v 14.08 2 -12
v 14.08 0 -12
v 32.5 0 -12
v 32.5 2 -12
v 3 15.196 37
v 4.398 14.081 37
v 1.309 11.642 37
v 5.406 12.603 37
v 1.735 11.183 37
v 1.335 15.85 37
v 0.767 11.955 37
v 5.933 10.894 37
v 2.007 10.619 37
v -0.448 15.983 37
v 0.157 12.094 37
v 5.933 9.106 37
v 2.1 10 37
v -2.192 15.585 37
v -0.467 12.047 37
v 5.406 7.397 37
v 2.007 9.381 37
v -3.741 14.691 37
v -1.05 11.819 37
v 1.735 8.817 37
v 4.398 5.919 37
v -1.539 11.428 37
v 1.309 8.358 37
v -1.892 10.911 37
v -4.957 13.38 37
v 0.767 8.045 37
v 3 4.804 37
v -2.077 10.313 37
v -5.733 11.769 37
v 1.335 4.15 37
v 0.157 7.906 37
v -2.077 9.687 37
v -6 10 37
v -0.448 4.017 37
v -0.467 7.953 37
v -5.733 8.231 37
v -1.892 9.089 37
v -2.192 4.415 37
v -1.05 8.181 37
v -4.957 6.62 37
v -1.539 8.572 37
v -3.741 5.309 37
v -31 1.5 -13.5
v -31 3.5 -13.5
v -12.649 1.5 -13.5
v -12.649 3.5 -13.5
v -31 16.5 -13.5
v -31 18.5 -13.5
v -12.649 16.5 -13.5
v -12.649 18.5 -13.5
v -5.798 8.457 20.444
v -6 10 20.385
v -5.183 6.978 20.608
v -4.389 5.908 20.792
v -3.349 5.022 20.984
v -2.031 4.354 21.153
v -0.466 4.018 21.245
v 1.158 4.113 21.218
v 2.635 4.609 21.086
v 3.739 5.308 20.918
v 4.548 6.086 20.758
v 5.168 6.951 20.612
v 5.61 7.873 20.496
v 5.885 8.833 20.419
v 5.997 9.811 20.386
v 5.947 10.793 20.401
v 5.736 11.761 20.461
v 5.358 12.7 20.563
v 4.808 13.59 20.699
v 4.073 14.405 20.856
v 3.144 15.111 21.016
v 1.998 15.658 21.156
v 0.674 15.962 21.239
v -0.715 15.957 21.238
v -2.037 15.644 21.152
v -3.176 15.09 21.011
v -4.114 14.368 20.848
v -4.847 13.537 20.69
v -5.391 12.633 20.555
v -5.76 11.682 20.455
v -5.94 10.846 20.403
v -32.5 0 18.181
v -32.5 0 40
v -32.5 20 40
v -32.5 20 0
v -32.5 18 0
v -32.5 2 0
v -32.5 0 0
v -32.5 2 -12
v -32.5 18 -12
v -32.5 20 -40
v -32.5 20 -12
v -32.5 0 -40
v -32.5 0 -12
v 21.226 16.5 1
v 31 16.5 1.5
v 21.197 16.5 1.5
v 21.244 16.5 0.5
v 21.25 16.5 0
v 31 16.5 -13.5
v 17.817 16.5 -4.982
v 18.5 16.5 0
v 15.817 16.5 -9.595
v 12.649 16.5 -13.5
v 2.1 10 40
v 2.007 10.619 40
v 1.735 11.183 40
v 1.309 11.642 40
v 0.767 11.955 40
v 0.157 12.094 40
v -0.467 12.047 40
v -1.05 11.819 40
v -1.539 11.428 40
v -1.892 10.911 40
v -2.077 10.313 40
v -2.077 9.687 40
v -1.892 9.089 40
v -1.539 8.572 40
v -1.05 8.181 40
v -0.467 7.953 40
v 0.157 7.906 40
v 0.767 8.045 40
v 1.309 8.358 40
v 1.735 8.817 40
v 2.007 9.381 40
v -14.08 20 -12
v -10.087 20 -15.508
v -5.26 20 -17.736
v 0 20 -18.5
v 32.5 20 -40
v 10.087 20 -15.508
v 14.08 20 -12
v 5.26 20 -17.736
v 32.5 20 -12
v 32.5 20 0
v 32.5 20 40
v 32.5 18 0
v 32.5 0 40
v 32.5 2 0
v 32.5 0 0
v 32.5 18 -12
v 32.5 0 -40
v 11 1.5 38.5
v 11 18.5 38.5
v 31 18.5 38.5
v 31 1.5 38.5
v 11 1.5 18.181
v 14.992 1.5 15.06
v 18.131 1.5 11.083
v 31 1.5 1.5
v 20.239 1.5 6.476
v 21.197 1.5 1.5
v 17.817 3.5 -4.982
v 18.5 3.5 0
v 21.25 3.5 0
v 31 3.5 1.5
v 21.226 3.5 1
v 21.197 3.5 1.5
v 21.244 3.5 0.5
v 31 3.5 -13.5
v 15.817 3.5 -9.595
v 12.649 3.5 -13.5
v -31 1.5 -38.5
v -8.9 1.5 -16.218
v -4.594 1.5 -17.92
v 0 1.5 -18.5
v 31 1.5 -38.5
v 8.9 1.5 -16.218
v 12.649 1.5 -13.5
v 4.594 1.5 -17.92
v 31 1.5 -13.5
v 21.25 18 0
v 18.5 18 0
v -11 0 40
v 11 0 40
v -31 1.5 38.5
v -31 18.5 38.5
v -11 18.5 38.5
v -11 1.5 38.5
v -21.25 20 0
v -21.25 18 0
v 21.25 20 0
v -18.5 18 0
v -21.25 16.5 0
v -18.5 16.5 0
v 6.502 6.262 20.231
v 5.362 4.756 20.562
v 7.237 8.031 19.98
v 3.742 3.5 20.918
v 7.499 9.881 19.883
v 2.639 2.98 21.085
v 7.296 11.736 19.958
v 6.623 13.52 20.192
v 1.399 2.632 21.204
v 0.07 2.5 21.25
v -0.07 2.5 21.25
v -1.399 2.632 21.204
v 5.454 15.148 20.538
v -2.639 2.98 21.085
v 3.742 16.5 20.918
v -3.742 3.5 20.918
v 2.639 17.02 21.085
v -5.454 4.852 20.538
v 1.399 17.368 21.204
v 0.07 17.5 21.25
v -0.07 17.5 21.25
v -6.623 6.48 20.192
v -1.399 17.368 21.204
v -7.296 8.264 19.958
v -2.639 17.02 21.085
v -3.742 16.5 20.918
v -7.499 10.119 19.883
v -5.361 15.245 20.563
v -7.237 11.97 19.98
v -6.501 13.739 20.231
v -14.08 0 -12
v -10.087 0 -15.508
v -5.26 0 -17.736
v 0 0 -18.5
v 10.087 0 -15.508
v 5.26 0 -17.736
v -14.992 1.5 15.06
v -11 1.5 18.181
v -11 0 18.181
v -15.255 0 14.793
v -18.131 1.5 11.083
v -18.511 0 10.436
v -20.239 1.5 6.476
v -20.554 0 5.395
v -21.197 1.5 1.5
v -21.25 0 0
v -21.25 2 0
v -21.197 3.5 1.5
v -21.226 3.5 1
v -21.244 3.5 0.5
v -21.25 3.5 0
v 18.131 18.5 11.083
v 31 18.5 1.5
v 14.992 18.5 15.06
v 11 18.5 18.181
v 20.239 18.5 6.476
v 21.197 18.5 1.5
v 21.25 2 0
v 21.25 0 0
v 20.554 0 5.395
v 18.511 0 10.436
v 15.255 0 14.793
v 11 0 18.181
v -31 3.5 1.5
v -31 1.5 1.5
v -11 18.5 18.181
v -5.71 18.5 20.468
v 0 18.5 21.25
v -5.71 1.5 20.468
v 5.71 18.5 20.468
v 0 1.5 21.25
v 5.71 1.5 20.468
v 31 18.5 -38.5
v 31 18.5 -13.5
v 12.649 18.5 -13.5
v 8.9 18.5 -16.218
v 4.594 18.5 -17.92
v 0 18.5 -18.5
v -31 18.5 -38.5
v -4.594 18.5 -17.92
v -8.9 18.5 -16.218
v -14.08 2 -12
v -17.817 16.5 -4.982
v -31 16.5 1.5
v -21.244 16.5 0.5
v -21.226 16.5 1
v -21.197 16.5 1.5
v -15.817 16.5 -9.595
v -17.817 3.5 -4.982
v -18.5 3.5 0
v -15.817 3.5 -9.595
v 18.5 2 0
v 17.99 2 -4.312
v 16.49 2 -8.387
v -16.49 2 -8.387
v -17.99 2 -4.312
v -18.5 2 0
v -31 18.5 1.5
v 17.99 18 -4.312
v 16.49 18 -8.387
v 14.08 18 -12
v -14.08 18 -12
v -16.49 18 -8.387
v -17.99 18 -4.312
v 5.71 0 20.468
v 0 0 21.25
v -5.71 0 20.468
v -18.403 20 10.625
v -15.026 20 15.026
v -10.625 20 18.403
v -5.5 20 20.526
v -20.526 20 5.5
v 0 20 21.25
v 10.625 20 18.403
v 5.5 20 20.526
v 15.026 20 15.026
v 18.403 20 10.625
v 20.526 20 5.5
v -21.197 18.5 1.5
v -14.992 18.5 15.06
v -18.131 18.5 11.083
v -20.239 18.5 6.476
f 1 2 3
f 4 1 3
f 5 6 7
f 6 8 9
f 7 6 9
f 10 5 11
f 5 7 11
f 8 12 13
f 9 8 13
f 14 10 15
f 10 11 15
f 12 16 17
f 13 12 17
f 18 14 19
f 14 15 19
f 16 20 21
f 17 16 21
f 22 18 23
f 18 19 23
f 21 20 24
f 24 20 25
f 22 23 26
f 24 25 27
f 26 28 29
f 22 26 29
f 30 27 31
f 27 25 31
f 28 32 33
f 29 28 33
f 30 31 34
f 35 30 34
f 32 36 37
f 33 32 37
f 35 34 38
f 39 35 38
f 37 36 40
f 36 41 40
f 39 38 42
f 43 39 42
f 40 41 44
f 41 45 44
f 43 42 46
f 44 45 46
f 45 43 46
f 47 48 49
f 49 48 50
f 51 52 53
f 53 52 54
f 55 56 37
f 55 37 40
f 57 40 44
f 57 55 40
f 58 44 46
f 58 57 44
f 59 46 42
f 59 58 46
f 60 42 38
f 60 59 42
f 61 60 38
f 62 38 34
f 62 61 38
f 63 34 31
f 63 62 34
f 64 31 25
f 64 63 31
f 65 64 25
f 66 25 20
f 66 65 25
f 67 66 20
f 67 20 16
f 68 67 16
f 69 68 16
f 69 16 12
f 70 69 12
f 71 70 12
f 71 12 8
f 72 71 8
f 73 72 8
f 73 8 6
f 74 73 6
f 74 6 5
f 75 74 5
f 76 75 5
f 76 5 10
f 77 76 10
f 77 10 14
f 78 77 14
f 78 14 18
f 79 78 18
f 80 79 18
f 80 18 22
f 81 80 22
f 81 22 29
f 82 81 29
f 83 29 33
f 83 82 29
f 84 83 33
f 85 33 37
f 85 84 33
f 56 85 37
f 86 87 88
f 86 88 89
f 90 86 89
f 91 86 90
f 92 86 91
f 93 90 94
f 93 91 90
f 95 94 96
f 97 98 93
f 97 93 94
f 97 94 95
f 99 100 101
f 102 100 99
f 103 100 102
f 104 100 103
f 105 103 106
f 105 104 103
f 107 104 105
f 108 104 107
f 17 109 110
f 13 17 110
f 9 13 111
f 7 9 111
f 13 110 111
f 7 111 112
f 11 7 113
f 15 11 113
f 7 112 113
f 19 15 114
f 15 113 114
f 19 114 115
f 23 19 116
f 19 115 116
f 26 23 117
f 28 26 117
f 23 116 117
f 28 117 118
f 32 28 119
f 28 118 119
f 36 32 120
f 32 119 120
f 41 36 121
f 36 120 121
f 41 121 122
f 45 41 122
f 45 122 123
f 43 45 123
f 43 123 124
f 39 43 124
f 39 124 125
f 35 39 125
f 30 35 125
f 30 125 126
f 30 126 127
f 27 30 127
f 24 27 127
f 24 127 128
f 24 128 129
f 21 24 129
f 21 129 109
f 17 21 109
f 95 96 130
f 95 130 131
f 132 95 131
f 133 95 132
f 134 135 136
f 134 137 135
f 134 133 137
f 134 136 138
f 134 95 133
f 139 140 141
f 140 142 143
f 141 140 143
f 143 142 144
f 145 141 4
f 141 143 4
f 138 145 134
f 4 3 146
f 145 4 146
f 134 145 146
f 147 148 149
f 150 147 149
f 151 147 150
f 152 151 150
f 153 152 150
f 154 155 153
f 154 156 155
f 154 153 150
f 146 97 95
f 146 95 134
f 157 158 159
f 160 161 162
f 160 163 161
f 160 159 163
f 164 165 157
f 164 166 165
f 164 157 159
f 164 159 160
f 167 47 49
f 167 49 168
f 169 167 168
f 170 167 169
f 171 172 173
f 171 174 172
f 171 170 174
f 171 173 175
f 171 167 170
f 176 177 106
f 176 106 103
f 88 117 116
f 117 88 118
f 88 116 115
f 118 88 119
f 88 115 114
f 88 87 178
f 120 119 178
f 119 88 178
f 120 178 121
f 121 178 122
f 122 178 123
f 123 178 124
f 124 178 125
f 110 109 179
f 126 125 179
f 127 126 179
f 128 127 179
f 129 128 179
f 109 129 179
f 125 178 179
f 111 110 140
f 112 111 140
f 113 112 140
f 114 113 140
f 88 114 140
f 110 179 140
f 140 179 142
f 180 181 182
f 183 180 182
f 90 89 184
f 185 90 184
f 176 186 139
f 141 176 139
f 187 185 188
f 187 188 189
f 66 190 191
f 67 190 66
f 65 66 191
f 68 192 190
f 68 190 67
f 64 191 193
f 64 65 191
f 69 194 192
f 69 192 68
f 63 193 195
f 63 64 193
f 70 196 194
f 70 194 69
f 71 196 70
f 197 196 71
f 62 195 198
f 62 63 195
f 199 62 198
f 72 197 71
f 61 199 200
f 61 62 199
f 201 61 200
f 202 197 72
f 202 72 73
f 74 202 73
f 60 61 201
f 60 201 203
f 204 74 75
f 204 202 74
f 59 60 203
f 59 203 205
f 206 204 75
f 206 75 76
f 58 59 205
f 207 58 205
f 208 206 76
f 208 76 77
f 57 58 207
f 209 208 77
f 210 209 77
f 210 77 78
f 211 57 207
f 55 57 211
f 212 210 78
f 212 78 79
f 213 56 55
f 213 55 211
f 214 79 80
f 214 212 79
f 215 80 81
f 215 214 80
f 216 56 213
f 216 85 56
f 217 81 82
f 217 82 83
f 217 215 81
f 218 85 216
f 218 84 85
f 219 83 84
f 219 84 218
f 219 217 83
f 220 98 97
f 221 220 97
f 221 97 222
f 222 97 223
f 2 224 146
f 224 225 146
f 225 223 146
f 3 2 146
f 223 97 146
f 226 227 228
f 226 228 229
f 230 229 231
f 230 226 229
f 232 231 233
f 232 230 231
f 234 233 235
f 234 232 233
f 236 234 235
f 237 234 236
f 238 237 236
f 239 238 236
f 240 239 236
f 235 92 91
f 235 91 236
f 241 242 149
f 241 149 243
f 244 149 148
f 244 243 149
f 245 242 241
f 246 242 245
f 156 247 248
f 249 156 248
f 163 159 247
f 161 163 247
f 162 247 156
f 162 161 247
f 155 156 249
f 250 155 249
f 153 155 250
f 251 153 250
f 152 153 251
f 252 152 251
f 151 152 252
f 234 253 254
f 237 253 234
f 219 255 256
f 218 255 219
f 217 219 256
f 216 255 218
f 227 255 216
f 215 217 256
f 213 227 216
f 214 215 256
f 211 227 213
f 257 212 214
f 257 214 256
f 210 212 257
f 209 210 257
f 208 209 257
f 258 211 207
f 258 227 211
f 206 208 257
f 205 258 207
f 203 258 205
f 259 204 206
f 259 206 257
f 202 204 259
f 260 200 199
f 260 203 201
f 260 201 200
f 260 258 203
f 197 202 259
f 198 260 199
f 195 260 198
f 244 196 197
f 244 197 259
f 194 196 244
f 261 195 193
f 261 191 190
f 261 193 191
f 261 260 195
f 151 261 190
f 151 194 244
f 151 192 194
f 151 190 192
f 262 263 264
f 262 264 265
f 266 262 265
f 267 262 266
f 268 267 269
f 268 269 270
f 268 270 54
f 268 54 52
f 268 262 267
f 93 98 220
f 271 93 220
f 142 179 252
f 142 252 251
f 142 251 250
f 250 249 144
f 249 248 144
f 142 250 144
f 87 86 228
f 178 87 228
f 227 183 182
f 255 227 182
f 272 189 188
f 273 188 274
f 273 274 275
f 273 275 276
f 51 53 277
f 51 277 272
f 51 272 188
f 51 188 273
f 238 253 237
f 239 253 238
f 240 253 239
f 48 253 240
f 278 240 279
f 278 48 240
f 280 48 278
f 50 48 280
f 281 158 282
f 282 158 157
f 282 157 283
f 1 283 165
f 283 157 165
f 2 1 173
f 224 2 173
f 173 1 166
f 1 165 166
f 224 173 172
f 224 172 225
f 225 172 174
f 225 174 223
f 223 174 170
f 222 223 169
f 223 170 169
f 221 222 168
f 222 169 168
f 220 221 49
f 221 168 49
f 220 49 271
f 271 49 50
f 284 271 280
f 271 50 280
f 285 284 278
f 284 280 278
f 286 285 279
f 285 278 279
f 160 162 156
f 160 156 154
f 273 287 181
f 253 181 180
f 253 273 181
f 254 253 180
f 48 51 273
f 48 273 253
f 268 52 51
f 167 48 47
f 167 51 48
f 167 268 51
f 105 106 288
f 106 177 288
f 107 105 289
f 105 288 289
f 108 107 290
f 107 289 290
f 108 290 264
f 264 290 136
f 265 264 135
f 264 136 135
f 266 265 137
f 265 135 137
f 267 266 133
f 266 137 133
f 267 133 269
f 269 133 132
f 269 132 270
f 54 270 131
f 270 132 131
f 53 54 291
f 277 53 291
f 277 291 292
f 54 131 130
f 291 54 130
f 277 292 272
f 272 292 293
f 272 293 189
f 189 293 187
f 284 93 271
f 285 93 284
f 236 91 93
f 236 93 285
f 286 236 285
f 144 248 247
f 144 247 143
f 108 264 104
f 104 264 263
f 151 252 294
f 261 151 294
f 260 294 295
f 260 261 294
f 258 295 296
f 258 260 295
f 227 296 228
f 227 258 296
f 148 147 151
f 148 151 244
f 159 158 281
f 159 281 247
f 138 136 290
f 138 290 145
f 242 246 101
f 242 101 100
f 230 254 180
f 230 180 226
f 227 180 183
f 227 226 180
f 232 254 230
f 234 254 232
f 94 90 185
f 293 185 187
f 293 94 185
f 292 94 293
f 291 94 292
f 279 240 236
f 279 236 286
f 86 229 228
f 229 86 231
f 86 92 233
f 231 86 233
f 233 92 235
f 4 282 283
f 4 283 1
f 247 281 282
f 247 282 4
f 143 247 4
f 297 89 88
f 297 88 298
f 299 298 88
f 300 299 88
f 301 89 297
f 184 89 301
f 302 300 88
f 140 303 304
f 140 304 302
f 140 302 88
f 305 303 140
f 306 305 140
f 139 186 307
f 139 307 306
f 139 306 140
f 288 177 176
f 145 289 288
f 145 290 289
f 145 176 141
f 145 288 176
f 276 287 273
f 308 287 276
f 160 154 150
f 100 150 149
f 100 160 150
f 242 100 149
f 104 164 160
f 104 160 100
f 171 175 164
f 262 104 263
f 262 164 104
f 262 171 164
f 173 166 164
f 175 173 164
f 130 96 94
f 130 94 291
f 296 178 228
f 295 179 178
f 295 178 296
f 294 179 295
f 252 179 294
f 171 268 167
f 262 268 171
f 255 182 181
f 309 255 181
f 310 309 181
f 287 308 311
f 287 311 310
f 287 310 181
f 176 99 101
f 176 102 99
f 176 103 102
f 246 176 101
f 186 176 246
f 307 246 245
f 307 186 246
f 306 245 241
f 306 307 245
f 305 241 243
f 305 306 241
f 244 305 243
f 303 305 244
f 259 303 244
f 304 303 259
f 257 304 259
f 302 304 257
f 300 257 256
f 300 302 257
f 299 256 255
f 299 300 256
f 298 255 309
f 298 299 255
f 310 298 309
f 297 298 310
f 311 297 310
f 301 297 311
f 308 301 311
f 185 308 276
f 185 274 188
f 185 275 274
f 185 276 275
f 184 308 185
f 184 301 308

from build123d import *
from build123d.topology import SkipClean

# Parameters (mm, degrees)
SKETCH_1_W              = 65
SKETCH_1_H              = 80
EXTRUDE_1_DEPTH         = 20
CUT_EXTRUDE_1_DEPTH     = 56.283360969
SKETCH_3_R              = 18.5
CUT_EXTRUDE_2_DEPTH     = 56.283360969
SKETCH_4_R              = 6
CUT_EXTRUDE_3_DEPTH     = 37
CUT_EXTRUDE_4_REACH     = 90.635
SKETCH_5_R              = 2.1
SKETCH_6_W              = 65
SKETCH_6_H              = 12
CUT_EXTRUDE_5_DEPTH     = 2
SKETCH_7_W              = 65
SKETCH_7_H              = 12
CUT_EXTRUDE_6_DEPTH     = 2
SHELL_START             = -38.5
SHELL_1_DEPTH           = 77
SHELL_1_2_DEPTH         = 25
SHELL_START_2           = 1.5
SHELL_1_3_DEPTH         = 37
EXTRUDE_START           = 21.249883538
EXTRUDE_2_OUTLINE_W     = 22
EXTRUDE_2_OUTLINE_H     = 17
EXTRUDE_2_OUTLINE_R     = 7.5
EXTRUDE_2_OUTLINE_H_2   = 26.054315759
EXTRUDE_2_DEPTH         = 18.750116462
EXTRUDE_START_2         = 18.181377836
EXTRUDE_2_2_OUTLINE_W   = 22
EXTRUDE_2_2_OUTLINE_H   = 17
EXTRUDE_2_2_OUTLINE_H_2 = 26.054315759
EXTRUDE_2_2_DEPTH       = 3.068505702
EXTRUDE_START_3         = -26.054315759
EXTRUDE_2_3_DEPTH       = 44.554315759
SKETCH_9_W              = 21.818622164
SKETCH_9_H              = 26.054315759
CUT_EXTRUDE_7_DEPTH     = 65.583878559


with BuildPart() as part:
    # 草图1 → 凸台-拉伸1 (new body)
    with BuildSketch(Plane(origin=(0, 0, 0), x_dir=(1, 0, 0), z_dir=(0, 1, 0))):
        Rectangle(SKETCH_1_W, SKETCH_1_H)
    extrude(amount=EXTRUDE_1_DEPTH)

    # 草图2 → 切除-拉伸1 (cut, through all)
    with BuildSketch(Plane(origin=(0, 20, 0), x_dir=(1, 0, 0), z_dir=(0, 1, 0))):
        with BuildLine():
            Line((-21.25, 0), (21.25, 0))
            ThreePointArc((21.25, 0), (0, -21.25), (-21.25, 0))
        make_face()
    extrude(amount=-CUT_EXTRUDE_1_DEPTH, mode=Mode.SUBTRACT)

    # 草图3 → 切除-拉伸2 (cut, through all)
    with BuildSketch(Plane(origin=(0, 20, 0), x_dir=(-1, 0, 0), z_dir=(0, 1, 0))):
        Circle(SKETCH_3_R)
    extrude(amount=-CUT_EXTRUDE_2_DEPTH, mode=Mode.SUBTRACT)

    # 草图4 → 切除-拉伸3 (cut)
    with BuildSketch(Plane.XY):
        with Locations(Location((0, 10, 0), (0, 0, 180))):
            Circle(SKETCH_4_R)
    extrude(amount=CUT_EXTRUDE_3_DEPTH, mode=Mode.SUBTRACT)

    # 草图5 → 切除-拉伸4 (cut, up to next)
    with BuildSketch(Plane.XY.offset(40), mode=Mode.PRIVATE) as cut_extrude_4_sk1:
        with Locations((0, 10)):
            Circle(SKETCH_5_R)
    cut_extrude_4_tool1 = extrude(cut_extrude_4_sk1.sketch, amount=-CUT_EXTRUDE_4_REACH, mode=Mode.PRIVATE) & part.part
    add(cut_extrude_4_tool1.solids().sort_by_distance((0, 10, 40))[0], mode=Mode.SUBTRACT)

    # 草图6 → 切除-拉伸5 (cut)
    with BuildSketch(Plane(origin=(0, 20, 0), x_dir=(1, 0, 0), z_dir=(0, 1, 0))):
        with Locations((0, 6)):
            Rectangle(SKETCH_6_W, SKETCH_6_H)
    extrude(amount=-CUT_EXTRUDE_5_DEPTH, mode=Mode.SUBTRACT)

    # 草图7 → 切除-拉伸6 (cut)
    with BuildSketch(Plane.XZ):
        with Locations((0, -6)):
            Rectangle(SKETCH_7_W, SKETCH_7_H)
    extrude(amount=-CUT_EXTRUDE_6_DEPTH, mode=Mode.SUBTRACT)

    # 抽壳1: read off the stored shape, not the designer's step
    # 抽壳1 outline → 抽壳1 (cut)
    with BuildSketch(Plane.XY.offset(SHELL_START)):
        with BuildLine():
            Line((3.741657387, 3.5), (31, 3.5))
            Line((31, 3.5), (31, 16.5))
            Line((31, 16.5), (3.741657387, 16.5))
            ThreePointArc((3.741657387, 16.5), (7.5, 10), (3.741657387, 3.5))
        make_face()
        with BuildLine():
            Line((-31, 16.5), (-31, 3.5))
            Line((-31, 3.5), (-3.741657387, 3.5))
            ThreePointArc((-3.741657387, 3.5), (-7.5, 10), (-3.741657387, 16.5))
            Line((-3.741657387, 16.5), (-31, 16.5))
        make_face()
    extrude(amount=SHELL_1_DEPTH, mode=Mode.SUBTRACT)

    # Shell 1 2 outline → Shell 1 2 (cut)
    with BuildSketch(Plane.XY.offset(SHELL_START)):
        with BuildLine():
            Line((-31, 1.5), (31, 1.5))
            Line((31, 1.5), (31, 3.5))
            Line((31, 3.5), (3.741657387, 3.5))
            ThreePointArc((3.741657387, 3.5), (7.5, 10), (3.741657387, 16.5))
            Line((3.741657387, 16.5), (31, 16.5))
            Line((31, 16.5), (31, 18.5))
            Line((31, 18.5), (-31, 18.5))
            Line((-31, 18.5), (-31, 16.5))
            Line((-31, 16.5), (-3.741657387, 16.5))
            ThreePointArc((-3.741657387, 16.5), (-7.5, 10), (-3.741657387, 3.5))
            Line((-3.741657387, 3.5), (-31, 3.5))
            Line((-31, 3.5), (-31, 1.5))
        make_face()
    extrude(amount=SHELL_1_2_DEPTH, mode=Mode.SUBTRACT)

    # Shell 1 3 outline → Shell 1 3 (cut)
    with BuildSketch(Plane.XY.offset(SHELL_START_2)):
        with BuildLine():
            Line((-31, 1.5), (31, 1.5))
            Line((31, 1.5), (31, 3.5))
            Line((31, 3.5), (3.741657387, 3.5))
            ThreePointArc((3.741657387, 3.5), (0, 2.5), (-3.741657387, 3.5))
            Line((-3.741657387, 3.5), (-31, 3.5))
            Line((-31, 3.5), (-31, 1.5))
        make_face()
        with BuildLine():
            Line((3.741657387, 16.5), (31, 16.5))
            Line((31, 16.5), (31, 18.5))
            Line((31, 18.5), (-31, 18.5))
            Line((-31, 18.5), (-31, 16.5))
            Line((-31, 16.5), (-3.741657387, 16.5))
            ThreePointArc((-3.741657387, 16.5), (0, 17.5), (3.741657387, 16.5))
        make_face()
    extrude(amount=SHELL_1_3_DEPTH, mode=Mode.SUBTRACT)

    # 凸台-拉伸2: read off the stored shape, not the designer's step
    # 凸台-拉伸2 outline → 凸台-拉伸2 (add)
    # profile 1 of 2: a face of its own
    with BuildSketch(Plane.XY.offset(EXTRUDE_START)):
        with Locations((0, 10)):
            Rectangle(EXTRUDE_2_OUTLINE_W, EXTRUDE_2_OUTLINE_H)
        with Locations((0, 10)):
            Circle(EXTRUDE_2_OUTLINE_R, mode=Mode.SUBTRACT)
    # profile 2 of 2: a face of its own
    with BuildSketch(Plane.XY.offset(EXTRUDE_START)):
        with Locations((0, -13.02715788)):
            Rectangle(EXTRUDE_2_OUTLINE_W, EXTRUDE_2_OUTLINE_H_2)
    extrude(amount=EXTRUDE_2_DEPTH)

    # Extrude 2 2 outline → Extrude 2 2 (add)
    # profile 1 of 2: a face of its own
    with BuildSketch(Plane.XY.offset(EXTRUDE_START_2)):
        with Locations((0, 10)):
            Rectangle(EXTRUDE_2_2_OUTLINE_W, EXTRUDE_2_2_OUTLINE_H)
        with BuildLine():
            ThreePointArc((0.070228488, 2.50032881), (-5.676e-05, 2.5), (-0.070342004, 2.500329874))
            ThreePointArc((-0.070342004, 2.500329874), (-7.5, 10.000015586), (-0.070310835, 17.499670419))
            ThreePointArc((-0.070310835, 17.499670419), (-2.7611e-05, 17.5), (0.070255616, 17.499670936))
            ThreePointArc((0.070255616, 17.499670936), (7.5, 9.999986435), (0.070228488, 2.50032881))
        make_face(mode=Mode.SUBTRACT)
    # profile 2 of 2: a face of its own
    with BuildSketch(Plane.XY.offset(EXTRUDE_START_2)):
        with Locations((0, -13.02715788)):
            Rectangle(EXTRUDE_2_2_OUTLINE_W, EXTRUDE_2_2_OUTLINE_H_2)
    extrude(amount=EXTRUDE_2_2_DEPTH)

    # Extrude 2 3 outline → Extrude 2 3 (cut)
    with SkipClean():  # the faces are left unmerged after this step: merging them gives an invalid solid
        with BuildSketch(Plane(origin=(0, 0, 0), x_dir=(1, 0, 0), z_dir=(0, 1, 0)).offset(EXTRUDE_START_3)):
            with BuildLine():
                Line((11, -18.181377836), (-11, -18.181377836))
                ThreePointArc((-11, -18.181377836), (0, -21.25), (11, -18.181377836))
            make_face()
        extrude(amount=EXTRUDE_2_3_DEPTH, mode=Mode.SUBTRACT)

    # 草图9 → 切除-拉伸7 (cut, through all)
    with SkipClean():  # the faces are left unmerged after this step: merging them gives an invalid solid
        with BuildSketch(Plane(origin=(11, 0, 0), x_dir=(0, 0, -1), z_dir=(1, 0, 0))):
            with Locations((-29.090688918, -13.02715788)):
                Rectangle(SKETCH_9_W, SKETCH_9_H)
        extrude(amount=-CUT_EXTRUDE_7_DEPTH, mode=Mode.SUBTRACT)


solid = part.part
